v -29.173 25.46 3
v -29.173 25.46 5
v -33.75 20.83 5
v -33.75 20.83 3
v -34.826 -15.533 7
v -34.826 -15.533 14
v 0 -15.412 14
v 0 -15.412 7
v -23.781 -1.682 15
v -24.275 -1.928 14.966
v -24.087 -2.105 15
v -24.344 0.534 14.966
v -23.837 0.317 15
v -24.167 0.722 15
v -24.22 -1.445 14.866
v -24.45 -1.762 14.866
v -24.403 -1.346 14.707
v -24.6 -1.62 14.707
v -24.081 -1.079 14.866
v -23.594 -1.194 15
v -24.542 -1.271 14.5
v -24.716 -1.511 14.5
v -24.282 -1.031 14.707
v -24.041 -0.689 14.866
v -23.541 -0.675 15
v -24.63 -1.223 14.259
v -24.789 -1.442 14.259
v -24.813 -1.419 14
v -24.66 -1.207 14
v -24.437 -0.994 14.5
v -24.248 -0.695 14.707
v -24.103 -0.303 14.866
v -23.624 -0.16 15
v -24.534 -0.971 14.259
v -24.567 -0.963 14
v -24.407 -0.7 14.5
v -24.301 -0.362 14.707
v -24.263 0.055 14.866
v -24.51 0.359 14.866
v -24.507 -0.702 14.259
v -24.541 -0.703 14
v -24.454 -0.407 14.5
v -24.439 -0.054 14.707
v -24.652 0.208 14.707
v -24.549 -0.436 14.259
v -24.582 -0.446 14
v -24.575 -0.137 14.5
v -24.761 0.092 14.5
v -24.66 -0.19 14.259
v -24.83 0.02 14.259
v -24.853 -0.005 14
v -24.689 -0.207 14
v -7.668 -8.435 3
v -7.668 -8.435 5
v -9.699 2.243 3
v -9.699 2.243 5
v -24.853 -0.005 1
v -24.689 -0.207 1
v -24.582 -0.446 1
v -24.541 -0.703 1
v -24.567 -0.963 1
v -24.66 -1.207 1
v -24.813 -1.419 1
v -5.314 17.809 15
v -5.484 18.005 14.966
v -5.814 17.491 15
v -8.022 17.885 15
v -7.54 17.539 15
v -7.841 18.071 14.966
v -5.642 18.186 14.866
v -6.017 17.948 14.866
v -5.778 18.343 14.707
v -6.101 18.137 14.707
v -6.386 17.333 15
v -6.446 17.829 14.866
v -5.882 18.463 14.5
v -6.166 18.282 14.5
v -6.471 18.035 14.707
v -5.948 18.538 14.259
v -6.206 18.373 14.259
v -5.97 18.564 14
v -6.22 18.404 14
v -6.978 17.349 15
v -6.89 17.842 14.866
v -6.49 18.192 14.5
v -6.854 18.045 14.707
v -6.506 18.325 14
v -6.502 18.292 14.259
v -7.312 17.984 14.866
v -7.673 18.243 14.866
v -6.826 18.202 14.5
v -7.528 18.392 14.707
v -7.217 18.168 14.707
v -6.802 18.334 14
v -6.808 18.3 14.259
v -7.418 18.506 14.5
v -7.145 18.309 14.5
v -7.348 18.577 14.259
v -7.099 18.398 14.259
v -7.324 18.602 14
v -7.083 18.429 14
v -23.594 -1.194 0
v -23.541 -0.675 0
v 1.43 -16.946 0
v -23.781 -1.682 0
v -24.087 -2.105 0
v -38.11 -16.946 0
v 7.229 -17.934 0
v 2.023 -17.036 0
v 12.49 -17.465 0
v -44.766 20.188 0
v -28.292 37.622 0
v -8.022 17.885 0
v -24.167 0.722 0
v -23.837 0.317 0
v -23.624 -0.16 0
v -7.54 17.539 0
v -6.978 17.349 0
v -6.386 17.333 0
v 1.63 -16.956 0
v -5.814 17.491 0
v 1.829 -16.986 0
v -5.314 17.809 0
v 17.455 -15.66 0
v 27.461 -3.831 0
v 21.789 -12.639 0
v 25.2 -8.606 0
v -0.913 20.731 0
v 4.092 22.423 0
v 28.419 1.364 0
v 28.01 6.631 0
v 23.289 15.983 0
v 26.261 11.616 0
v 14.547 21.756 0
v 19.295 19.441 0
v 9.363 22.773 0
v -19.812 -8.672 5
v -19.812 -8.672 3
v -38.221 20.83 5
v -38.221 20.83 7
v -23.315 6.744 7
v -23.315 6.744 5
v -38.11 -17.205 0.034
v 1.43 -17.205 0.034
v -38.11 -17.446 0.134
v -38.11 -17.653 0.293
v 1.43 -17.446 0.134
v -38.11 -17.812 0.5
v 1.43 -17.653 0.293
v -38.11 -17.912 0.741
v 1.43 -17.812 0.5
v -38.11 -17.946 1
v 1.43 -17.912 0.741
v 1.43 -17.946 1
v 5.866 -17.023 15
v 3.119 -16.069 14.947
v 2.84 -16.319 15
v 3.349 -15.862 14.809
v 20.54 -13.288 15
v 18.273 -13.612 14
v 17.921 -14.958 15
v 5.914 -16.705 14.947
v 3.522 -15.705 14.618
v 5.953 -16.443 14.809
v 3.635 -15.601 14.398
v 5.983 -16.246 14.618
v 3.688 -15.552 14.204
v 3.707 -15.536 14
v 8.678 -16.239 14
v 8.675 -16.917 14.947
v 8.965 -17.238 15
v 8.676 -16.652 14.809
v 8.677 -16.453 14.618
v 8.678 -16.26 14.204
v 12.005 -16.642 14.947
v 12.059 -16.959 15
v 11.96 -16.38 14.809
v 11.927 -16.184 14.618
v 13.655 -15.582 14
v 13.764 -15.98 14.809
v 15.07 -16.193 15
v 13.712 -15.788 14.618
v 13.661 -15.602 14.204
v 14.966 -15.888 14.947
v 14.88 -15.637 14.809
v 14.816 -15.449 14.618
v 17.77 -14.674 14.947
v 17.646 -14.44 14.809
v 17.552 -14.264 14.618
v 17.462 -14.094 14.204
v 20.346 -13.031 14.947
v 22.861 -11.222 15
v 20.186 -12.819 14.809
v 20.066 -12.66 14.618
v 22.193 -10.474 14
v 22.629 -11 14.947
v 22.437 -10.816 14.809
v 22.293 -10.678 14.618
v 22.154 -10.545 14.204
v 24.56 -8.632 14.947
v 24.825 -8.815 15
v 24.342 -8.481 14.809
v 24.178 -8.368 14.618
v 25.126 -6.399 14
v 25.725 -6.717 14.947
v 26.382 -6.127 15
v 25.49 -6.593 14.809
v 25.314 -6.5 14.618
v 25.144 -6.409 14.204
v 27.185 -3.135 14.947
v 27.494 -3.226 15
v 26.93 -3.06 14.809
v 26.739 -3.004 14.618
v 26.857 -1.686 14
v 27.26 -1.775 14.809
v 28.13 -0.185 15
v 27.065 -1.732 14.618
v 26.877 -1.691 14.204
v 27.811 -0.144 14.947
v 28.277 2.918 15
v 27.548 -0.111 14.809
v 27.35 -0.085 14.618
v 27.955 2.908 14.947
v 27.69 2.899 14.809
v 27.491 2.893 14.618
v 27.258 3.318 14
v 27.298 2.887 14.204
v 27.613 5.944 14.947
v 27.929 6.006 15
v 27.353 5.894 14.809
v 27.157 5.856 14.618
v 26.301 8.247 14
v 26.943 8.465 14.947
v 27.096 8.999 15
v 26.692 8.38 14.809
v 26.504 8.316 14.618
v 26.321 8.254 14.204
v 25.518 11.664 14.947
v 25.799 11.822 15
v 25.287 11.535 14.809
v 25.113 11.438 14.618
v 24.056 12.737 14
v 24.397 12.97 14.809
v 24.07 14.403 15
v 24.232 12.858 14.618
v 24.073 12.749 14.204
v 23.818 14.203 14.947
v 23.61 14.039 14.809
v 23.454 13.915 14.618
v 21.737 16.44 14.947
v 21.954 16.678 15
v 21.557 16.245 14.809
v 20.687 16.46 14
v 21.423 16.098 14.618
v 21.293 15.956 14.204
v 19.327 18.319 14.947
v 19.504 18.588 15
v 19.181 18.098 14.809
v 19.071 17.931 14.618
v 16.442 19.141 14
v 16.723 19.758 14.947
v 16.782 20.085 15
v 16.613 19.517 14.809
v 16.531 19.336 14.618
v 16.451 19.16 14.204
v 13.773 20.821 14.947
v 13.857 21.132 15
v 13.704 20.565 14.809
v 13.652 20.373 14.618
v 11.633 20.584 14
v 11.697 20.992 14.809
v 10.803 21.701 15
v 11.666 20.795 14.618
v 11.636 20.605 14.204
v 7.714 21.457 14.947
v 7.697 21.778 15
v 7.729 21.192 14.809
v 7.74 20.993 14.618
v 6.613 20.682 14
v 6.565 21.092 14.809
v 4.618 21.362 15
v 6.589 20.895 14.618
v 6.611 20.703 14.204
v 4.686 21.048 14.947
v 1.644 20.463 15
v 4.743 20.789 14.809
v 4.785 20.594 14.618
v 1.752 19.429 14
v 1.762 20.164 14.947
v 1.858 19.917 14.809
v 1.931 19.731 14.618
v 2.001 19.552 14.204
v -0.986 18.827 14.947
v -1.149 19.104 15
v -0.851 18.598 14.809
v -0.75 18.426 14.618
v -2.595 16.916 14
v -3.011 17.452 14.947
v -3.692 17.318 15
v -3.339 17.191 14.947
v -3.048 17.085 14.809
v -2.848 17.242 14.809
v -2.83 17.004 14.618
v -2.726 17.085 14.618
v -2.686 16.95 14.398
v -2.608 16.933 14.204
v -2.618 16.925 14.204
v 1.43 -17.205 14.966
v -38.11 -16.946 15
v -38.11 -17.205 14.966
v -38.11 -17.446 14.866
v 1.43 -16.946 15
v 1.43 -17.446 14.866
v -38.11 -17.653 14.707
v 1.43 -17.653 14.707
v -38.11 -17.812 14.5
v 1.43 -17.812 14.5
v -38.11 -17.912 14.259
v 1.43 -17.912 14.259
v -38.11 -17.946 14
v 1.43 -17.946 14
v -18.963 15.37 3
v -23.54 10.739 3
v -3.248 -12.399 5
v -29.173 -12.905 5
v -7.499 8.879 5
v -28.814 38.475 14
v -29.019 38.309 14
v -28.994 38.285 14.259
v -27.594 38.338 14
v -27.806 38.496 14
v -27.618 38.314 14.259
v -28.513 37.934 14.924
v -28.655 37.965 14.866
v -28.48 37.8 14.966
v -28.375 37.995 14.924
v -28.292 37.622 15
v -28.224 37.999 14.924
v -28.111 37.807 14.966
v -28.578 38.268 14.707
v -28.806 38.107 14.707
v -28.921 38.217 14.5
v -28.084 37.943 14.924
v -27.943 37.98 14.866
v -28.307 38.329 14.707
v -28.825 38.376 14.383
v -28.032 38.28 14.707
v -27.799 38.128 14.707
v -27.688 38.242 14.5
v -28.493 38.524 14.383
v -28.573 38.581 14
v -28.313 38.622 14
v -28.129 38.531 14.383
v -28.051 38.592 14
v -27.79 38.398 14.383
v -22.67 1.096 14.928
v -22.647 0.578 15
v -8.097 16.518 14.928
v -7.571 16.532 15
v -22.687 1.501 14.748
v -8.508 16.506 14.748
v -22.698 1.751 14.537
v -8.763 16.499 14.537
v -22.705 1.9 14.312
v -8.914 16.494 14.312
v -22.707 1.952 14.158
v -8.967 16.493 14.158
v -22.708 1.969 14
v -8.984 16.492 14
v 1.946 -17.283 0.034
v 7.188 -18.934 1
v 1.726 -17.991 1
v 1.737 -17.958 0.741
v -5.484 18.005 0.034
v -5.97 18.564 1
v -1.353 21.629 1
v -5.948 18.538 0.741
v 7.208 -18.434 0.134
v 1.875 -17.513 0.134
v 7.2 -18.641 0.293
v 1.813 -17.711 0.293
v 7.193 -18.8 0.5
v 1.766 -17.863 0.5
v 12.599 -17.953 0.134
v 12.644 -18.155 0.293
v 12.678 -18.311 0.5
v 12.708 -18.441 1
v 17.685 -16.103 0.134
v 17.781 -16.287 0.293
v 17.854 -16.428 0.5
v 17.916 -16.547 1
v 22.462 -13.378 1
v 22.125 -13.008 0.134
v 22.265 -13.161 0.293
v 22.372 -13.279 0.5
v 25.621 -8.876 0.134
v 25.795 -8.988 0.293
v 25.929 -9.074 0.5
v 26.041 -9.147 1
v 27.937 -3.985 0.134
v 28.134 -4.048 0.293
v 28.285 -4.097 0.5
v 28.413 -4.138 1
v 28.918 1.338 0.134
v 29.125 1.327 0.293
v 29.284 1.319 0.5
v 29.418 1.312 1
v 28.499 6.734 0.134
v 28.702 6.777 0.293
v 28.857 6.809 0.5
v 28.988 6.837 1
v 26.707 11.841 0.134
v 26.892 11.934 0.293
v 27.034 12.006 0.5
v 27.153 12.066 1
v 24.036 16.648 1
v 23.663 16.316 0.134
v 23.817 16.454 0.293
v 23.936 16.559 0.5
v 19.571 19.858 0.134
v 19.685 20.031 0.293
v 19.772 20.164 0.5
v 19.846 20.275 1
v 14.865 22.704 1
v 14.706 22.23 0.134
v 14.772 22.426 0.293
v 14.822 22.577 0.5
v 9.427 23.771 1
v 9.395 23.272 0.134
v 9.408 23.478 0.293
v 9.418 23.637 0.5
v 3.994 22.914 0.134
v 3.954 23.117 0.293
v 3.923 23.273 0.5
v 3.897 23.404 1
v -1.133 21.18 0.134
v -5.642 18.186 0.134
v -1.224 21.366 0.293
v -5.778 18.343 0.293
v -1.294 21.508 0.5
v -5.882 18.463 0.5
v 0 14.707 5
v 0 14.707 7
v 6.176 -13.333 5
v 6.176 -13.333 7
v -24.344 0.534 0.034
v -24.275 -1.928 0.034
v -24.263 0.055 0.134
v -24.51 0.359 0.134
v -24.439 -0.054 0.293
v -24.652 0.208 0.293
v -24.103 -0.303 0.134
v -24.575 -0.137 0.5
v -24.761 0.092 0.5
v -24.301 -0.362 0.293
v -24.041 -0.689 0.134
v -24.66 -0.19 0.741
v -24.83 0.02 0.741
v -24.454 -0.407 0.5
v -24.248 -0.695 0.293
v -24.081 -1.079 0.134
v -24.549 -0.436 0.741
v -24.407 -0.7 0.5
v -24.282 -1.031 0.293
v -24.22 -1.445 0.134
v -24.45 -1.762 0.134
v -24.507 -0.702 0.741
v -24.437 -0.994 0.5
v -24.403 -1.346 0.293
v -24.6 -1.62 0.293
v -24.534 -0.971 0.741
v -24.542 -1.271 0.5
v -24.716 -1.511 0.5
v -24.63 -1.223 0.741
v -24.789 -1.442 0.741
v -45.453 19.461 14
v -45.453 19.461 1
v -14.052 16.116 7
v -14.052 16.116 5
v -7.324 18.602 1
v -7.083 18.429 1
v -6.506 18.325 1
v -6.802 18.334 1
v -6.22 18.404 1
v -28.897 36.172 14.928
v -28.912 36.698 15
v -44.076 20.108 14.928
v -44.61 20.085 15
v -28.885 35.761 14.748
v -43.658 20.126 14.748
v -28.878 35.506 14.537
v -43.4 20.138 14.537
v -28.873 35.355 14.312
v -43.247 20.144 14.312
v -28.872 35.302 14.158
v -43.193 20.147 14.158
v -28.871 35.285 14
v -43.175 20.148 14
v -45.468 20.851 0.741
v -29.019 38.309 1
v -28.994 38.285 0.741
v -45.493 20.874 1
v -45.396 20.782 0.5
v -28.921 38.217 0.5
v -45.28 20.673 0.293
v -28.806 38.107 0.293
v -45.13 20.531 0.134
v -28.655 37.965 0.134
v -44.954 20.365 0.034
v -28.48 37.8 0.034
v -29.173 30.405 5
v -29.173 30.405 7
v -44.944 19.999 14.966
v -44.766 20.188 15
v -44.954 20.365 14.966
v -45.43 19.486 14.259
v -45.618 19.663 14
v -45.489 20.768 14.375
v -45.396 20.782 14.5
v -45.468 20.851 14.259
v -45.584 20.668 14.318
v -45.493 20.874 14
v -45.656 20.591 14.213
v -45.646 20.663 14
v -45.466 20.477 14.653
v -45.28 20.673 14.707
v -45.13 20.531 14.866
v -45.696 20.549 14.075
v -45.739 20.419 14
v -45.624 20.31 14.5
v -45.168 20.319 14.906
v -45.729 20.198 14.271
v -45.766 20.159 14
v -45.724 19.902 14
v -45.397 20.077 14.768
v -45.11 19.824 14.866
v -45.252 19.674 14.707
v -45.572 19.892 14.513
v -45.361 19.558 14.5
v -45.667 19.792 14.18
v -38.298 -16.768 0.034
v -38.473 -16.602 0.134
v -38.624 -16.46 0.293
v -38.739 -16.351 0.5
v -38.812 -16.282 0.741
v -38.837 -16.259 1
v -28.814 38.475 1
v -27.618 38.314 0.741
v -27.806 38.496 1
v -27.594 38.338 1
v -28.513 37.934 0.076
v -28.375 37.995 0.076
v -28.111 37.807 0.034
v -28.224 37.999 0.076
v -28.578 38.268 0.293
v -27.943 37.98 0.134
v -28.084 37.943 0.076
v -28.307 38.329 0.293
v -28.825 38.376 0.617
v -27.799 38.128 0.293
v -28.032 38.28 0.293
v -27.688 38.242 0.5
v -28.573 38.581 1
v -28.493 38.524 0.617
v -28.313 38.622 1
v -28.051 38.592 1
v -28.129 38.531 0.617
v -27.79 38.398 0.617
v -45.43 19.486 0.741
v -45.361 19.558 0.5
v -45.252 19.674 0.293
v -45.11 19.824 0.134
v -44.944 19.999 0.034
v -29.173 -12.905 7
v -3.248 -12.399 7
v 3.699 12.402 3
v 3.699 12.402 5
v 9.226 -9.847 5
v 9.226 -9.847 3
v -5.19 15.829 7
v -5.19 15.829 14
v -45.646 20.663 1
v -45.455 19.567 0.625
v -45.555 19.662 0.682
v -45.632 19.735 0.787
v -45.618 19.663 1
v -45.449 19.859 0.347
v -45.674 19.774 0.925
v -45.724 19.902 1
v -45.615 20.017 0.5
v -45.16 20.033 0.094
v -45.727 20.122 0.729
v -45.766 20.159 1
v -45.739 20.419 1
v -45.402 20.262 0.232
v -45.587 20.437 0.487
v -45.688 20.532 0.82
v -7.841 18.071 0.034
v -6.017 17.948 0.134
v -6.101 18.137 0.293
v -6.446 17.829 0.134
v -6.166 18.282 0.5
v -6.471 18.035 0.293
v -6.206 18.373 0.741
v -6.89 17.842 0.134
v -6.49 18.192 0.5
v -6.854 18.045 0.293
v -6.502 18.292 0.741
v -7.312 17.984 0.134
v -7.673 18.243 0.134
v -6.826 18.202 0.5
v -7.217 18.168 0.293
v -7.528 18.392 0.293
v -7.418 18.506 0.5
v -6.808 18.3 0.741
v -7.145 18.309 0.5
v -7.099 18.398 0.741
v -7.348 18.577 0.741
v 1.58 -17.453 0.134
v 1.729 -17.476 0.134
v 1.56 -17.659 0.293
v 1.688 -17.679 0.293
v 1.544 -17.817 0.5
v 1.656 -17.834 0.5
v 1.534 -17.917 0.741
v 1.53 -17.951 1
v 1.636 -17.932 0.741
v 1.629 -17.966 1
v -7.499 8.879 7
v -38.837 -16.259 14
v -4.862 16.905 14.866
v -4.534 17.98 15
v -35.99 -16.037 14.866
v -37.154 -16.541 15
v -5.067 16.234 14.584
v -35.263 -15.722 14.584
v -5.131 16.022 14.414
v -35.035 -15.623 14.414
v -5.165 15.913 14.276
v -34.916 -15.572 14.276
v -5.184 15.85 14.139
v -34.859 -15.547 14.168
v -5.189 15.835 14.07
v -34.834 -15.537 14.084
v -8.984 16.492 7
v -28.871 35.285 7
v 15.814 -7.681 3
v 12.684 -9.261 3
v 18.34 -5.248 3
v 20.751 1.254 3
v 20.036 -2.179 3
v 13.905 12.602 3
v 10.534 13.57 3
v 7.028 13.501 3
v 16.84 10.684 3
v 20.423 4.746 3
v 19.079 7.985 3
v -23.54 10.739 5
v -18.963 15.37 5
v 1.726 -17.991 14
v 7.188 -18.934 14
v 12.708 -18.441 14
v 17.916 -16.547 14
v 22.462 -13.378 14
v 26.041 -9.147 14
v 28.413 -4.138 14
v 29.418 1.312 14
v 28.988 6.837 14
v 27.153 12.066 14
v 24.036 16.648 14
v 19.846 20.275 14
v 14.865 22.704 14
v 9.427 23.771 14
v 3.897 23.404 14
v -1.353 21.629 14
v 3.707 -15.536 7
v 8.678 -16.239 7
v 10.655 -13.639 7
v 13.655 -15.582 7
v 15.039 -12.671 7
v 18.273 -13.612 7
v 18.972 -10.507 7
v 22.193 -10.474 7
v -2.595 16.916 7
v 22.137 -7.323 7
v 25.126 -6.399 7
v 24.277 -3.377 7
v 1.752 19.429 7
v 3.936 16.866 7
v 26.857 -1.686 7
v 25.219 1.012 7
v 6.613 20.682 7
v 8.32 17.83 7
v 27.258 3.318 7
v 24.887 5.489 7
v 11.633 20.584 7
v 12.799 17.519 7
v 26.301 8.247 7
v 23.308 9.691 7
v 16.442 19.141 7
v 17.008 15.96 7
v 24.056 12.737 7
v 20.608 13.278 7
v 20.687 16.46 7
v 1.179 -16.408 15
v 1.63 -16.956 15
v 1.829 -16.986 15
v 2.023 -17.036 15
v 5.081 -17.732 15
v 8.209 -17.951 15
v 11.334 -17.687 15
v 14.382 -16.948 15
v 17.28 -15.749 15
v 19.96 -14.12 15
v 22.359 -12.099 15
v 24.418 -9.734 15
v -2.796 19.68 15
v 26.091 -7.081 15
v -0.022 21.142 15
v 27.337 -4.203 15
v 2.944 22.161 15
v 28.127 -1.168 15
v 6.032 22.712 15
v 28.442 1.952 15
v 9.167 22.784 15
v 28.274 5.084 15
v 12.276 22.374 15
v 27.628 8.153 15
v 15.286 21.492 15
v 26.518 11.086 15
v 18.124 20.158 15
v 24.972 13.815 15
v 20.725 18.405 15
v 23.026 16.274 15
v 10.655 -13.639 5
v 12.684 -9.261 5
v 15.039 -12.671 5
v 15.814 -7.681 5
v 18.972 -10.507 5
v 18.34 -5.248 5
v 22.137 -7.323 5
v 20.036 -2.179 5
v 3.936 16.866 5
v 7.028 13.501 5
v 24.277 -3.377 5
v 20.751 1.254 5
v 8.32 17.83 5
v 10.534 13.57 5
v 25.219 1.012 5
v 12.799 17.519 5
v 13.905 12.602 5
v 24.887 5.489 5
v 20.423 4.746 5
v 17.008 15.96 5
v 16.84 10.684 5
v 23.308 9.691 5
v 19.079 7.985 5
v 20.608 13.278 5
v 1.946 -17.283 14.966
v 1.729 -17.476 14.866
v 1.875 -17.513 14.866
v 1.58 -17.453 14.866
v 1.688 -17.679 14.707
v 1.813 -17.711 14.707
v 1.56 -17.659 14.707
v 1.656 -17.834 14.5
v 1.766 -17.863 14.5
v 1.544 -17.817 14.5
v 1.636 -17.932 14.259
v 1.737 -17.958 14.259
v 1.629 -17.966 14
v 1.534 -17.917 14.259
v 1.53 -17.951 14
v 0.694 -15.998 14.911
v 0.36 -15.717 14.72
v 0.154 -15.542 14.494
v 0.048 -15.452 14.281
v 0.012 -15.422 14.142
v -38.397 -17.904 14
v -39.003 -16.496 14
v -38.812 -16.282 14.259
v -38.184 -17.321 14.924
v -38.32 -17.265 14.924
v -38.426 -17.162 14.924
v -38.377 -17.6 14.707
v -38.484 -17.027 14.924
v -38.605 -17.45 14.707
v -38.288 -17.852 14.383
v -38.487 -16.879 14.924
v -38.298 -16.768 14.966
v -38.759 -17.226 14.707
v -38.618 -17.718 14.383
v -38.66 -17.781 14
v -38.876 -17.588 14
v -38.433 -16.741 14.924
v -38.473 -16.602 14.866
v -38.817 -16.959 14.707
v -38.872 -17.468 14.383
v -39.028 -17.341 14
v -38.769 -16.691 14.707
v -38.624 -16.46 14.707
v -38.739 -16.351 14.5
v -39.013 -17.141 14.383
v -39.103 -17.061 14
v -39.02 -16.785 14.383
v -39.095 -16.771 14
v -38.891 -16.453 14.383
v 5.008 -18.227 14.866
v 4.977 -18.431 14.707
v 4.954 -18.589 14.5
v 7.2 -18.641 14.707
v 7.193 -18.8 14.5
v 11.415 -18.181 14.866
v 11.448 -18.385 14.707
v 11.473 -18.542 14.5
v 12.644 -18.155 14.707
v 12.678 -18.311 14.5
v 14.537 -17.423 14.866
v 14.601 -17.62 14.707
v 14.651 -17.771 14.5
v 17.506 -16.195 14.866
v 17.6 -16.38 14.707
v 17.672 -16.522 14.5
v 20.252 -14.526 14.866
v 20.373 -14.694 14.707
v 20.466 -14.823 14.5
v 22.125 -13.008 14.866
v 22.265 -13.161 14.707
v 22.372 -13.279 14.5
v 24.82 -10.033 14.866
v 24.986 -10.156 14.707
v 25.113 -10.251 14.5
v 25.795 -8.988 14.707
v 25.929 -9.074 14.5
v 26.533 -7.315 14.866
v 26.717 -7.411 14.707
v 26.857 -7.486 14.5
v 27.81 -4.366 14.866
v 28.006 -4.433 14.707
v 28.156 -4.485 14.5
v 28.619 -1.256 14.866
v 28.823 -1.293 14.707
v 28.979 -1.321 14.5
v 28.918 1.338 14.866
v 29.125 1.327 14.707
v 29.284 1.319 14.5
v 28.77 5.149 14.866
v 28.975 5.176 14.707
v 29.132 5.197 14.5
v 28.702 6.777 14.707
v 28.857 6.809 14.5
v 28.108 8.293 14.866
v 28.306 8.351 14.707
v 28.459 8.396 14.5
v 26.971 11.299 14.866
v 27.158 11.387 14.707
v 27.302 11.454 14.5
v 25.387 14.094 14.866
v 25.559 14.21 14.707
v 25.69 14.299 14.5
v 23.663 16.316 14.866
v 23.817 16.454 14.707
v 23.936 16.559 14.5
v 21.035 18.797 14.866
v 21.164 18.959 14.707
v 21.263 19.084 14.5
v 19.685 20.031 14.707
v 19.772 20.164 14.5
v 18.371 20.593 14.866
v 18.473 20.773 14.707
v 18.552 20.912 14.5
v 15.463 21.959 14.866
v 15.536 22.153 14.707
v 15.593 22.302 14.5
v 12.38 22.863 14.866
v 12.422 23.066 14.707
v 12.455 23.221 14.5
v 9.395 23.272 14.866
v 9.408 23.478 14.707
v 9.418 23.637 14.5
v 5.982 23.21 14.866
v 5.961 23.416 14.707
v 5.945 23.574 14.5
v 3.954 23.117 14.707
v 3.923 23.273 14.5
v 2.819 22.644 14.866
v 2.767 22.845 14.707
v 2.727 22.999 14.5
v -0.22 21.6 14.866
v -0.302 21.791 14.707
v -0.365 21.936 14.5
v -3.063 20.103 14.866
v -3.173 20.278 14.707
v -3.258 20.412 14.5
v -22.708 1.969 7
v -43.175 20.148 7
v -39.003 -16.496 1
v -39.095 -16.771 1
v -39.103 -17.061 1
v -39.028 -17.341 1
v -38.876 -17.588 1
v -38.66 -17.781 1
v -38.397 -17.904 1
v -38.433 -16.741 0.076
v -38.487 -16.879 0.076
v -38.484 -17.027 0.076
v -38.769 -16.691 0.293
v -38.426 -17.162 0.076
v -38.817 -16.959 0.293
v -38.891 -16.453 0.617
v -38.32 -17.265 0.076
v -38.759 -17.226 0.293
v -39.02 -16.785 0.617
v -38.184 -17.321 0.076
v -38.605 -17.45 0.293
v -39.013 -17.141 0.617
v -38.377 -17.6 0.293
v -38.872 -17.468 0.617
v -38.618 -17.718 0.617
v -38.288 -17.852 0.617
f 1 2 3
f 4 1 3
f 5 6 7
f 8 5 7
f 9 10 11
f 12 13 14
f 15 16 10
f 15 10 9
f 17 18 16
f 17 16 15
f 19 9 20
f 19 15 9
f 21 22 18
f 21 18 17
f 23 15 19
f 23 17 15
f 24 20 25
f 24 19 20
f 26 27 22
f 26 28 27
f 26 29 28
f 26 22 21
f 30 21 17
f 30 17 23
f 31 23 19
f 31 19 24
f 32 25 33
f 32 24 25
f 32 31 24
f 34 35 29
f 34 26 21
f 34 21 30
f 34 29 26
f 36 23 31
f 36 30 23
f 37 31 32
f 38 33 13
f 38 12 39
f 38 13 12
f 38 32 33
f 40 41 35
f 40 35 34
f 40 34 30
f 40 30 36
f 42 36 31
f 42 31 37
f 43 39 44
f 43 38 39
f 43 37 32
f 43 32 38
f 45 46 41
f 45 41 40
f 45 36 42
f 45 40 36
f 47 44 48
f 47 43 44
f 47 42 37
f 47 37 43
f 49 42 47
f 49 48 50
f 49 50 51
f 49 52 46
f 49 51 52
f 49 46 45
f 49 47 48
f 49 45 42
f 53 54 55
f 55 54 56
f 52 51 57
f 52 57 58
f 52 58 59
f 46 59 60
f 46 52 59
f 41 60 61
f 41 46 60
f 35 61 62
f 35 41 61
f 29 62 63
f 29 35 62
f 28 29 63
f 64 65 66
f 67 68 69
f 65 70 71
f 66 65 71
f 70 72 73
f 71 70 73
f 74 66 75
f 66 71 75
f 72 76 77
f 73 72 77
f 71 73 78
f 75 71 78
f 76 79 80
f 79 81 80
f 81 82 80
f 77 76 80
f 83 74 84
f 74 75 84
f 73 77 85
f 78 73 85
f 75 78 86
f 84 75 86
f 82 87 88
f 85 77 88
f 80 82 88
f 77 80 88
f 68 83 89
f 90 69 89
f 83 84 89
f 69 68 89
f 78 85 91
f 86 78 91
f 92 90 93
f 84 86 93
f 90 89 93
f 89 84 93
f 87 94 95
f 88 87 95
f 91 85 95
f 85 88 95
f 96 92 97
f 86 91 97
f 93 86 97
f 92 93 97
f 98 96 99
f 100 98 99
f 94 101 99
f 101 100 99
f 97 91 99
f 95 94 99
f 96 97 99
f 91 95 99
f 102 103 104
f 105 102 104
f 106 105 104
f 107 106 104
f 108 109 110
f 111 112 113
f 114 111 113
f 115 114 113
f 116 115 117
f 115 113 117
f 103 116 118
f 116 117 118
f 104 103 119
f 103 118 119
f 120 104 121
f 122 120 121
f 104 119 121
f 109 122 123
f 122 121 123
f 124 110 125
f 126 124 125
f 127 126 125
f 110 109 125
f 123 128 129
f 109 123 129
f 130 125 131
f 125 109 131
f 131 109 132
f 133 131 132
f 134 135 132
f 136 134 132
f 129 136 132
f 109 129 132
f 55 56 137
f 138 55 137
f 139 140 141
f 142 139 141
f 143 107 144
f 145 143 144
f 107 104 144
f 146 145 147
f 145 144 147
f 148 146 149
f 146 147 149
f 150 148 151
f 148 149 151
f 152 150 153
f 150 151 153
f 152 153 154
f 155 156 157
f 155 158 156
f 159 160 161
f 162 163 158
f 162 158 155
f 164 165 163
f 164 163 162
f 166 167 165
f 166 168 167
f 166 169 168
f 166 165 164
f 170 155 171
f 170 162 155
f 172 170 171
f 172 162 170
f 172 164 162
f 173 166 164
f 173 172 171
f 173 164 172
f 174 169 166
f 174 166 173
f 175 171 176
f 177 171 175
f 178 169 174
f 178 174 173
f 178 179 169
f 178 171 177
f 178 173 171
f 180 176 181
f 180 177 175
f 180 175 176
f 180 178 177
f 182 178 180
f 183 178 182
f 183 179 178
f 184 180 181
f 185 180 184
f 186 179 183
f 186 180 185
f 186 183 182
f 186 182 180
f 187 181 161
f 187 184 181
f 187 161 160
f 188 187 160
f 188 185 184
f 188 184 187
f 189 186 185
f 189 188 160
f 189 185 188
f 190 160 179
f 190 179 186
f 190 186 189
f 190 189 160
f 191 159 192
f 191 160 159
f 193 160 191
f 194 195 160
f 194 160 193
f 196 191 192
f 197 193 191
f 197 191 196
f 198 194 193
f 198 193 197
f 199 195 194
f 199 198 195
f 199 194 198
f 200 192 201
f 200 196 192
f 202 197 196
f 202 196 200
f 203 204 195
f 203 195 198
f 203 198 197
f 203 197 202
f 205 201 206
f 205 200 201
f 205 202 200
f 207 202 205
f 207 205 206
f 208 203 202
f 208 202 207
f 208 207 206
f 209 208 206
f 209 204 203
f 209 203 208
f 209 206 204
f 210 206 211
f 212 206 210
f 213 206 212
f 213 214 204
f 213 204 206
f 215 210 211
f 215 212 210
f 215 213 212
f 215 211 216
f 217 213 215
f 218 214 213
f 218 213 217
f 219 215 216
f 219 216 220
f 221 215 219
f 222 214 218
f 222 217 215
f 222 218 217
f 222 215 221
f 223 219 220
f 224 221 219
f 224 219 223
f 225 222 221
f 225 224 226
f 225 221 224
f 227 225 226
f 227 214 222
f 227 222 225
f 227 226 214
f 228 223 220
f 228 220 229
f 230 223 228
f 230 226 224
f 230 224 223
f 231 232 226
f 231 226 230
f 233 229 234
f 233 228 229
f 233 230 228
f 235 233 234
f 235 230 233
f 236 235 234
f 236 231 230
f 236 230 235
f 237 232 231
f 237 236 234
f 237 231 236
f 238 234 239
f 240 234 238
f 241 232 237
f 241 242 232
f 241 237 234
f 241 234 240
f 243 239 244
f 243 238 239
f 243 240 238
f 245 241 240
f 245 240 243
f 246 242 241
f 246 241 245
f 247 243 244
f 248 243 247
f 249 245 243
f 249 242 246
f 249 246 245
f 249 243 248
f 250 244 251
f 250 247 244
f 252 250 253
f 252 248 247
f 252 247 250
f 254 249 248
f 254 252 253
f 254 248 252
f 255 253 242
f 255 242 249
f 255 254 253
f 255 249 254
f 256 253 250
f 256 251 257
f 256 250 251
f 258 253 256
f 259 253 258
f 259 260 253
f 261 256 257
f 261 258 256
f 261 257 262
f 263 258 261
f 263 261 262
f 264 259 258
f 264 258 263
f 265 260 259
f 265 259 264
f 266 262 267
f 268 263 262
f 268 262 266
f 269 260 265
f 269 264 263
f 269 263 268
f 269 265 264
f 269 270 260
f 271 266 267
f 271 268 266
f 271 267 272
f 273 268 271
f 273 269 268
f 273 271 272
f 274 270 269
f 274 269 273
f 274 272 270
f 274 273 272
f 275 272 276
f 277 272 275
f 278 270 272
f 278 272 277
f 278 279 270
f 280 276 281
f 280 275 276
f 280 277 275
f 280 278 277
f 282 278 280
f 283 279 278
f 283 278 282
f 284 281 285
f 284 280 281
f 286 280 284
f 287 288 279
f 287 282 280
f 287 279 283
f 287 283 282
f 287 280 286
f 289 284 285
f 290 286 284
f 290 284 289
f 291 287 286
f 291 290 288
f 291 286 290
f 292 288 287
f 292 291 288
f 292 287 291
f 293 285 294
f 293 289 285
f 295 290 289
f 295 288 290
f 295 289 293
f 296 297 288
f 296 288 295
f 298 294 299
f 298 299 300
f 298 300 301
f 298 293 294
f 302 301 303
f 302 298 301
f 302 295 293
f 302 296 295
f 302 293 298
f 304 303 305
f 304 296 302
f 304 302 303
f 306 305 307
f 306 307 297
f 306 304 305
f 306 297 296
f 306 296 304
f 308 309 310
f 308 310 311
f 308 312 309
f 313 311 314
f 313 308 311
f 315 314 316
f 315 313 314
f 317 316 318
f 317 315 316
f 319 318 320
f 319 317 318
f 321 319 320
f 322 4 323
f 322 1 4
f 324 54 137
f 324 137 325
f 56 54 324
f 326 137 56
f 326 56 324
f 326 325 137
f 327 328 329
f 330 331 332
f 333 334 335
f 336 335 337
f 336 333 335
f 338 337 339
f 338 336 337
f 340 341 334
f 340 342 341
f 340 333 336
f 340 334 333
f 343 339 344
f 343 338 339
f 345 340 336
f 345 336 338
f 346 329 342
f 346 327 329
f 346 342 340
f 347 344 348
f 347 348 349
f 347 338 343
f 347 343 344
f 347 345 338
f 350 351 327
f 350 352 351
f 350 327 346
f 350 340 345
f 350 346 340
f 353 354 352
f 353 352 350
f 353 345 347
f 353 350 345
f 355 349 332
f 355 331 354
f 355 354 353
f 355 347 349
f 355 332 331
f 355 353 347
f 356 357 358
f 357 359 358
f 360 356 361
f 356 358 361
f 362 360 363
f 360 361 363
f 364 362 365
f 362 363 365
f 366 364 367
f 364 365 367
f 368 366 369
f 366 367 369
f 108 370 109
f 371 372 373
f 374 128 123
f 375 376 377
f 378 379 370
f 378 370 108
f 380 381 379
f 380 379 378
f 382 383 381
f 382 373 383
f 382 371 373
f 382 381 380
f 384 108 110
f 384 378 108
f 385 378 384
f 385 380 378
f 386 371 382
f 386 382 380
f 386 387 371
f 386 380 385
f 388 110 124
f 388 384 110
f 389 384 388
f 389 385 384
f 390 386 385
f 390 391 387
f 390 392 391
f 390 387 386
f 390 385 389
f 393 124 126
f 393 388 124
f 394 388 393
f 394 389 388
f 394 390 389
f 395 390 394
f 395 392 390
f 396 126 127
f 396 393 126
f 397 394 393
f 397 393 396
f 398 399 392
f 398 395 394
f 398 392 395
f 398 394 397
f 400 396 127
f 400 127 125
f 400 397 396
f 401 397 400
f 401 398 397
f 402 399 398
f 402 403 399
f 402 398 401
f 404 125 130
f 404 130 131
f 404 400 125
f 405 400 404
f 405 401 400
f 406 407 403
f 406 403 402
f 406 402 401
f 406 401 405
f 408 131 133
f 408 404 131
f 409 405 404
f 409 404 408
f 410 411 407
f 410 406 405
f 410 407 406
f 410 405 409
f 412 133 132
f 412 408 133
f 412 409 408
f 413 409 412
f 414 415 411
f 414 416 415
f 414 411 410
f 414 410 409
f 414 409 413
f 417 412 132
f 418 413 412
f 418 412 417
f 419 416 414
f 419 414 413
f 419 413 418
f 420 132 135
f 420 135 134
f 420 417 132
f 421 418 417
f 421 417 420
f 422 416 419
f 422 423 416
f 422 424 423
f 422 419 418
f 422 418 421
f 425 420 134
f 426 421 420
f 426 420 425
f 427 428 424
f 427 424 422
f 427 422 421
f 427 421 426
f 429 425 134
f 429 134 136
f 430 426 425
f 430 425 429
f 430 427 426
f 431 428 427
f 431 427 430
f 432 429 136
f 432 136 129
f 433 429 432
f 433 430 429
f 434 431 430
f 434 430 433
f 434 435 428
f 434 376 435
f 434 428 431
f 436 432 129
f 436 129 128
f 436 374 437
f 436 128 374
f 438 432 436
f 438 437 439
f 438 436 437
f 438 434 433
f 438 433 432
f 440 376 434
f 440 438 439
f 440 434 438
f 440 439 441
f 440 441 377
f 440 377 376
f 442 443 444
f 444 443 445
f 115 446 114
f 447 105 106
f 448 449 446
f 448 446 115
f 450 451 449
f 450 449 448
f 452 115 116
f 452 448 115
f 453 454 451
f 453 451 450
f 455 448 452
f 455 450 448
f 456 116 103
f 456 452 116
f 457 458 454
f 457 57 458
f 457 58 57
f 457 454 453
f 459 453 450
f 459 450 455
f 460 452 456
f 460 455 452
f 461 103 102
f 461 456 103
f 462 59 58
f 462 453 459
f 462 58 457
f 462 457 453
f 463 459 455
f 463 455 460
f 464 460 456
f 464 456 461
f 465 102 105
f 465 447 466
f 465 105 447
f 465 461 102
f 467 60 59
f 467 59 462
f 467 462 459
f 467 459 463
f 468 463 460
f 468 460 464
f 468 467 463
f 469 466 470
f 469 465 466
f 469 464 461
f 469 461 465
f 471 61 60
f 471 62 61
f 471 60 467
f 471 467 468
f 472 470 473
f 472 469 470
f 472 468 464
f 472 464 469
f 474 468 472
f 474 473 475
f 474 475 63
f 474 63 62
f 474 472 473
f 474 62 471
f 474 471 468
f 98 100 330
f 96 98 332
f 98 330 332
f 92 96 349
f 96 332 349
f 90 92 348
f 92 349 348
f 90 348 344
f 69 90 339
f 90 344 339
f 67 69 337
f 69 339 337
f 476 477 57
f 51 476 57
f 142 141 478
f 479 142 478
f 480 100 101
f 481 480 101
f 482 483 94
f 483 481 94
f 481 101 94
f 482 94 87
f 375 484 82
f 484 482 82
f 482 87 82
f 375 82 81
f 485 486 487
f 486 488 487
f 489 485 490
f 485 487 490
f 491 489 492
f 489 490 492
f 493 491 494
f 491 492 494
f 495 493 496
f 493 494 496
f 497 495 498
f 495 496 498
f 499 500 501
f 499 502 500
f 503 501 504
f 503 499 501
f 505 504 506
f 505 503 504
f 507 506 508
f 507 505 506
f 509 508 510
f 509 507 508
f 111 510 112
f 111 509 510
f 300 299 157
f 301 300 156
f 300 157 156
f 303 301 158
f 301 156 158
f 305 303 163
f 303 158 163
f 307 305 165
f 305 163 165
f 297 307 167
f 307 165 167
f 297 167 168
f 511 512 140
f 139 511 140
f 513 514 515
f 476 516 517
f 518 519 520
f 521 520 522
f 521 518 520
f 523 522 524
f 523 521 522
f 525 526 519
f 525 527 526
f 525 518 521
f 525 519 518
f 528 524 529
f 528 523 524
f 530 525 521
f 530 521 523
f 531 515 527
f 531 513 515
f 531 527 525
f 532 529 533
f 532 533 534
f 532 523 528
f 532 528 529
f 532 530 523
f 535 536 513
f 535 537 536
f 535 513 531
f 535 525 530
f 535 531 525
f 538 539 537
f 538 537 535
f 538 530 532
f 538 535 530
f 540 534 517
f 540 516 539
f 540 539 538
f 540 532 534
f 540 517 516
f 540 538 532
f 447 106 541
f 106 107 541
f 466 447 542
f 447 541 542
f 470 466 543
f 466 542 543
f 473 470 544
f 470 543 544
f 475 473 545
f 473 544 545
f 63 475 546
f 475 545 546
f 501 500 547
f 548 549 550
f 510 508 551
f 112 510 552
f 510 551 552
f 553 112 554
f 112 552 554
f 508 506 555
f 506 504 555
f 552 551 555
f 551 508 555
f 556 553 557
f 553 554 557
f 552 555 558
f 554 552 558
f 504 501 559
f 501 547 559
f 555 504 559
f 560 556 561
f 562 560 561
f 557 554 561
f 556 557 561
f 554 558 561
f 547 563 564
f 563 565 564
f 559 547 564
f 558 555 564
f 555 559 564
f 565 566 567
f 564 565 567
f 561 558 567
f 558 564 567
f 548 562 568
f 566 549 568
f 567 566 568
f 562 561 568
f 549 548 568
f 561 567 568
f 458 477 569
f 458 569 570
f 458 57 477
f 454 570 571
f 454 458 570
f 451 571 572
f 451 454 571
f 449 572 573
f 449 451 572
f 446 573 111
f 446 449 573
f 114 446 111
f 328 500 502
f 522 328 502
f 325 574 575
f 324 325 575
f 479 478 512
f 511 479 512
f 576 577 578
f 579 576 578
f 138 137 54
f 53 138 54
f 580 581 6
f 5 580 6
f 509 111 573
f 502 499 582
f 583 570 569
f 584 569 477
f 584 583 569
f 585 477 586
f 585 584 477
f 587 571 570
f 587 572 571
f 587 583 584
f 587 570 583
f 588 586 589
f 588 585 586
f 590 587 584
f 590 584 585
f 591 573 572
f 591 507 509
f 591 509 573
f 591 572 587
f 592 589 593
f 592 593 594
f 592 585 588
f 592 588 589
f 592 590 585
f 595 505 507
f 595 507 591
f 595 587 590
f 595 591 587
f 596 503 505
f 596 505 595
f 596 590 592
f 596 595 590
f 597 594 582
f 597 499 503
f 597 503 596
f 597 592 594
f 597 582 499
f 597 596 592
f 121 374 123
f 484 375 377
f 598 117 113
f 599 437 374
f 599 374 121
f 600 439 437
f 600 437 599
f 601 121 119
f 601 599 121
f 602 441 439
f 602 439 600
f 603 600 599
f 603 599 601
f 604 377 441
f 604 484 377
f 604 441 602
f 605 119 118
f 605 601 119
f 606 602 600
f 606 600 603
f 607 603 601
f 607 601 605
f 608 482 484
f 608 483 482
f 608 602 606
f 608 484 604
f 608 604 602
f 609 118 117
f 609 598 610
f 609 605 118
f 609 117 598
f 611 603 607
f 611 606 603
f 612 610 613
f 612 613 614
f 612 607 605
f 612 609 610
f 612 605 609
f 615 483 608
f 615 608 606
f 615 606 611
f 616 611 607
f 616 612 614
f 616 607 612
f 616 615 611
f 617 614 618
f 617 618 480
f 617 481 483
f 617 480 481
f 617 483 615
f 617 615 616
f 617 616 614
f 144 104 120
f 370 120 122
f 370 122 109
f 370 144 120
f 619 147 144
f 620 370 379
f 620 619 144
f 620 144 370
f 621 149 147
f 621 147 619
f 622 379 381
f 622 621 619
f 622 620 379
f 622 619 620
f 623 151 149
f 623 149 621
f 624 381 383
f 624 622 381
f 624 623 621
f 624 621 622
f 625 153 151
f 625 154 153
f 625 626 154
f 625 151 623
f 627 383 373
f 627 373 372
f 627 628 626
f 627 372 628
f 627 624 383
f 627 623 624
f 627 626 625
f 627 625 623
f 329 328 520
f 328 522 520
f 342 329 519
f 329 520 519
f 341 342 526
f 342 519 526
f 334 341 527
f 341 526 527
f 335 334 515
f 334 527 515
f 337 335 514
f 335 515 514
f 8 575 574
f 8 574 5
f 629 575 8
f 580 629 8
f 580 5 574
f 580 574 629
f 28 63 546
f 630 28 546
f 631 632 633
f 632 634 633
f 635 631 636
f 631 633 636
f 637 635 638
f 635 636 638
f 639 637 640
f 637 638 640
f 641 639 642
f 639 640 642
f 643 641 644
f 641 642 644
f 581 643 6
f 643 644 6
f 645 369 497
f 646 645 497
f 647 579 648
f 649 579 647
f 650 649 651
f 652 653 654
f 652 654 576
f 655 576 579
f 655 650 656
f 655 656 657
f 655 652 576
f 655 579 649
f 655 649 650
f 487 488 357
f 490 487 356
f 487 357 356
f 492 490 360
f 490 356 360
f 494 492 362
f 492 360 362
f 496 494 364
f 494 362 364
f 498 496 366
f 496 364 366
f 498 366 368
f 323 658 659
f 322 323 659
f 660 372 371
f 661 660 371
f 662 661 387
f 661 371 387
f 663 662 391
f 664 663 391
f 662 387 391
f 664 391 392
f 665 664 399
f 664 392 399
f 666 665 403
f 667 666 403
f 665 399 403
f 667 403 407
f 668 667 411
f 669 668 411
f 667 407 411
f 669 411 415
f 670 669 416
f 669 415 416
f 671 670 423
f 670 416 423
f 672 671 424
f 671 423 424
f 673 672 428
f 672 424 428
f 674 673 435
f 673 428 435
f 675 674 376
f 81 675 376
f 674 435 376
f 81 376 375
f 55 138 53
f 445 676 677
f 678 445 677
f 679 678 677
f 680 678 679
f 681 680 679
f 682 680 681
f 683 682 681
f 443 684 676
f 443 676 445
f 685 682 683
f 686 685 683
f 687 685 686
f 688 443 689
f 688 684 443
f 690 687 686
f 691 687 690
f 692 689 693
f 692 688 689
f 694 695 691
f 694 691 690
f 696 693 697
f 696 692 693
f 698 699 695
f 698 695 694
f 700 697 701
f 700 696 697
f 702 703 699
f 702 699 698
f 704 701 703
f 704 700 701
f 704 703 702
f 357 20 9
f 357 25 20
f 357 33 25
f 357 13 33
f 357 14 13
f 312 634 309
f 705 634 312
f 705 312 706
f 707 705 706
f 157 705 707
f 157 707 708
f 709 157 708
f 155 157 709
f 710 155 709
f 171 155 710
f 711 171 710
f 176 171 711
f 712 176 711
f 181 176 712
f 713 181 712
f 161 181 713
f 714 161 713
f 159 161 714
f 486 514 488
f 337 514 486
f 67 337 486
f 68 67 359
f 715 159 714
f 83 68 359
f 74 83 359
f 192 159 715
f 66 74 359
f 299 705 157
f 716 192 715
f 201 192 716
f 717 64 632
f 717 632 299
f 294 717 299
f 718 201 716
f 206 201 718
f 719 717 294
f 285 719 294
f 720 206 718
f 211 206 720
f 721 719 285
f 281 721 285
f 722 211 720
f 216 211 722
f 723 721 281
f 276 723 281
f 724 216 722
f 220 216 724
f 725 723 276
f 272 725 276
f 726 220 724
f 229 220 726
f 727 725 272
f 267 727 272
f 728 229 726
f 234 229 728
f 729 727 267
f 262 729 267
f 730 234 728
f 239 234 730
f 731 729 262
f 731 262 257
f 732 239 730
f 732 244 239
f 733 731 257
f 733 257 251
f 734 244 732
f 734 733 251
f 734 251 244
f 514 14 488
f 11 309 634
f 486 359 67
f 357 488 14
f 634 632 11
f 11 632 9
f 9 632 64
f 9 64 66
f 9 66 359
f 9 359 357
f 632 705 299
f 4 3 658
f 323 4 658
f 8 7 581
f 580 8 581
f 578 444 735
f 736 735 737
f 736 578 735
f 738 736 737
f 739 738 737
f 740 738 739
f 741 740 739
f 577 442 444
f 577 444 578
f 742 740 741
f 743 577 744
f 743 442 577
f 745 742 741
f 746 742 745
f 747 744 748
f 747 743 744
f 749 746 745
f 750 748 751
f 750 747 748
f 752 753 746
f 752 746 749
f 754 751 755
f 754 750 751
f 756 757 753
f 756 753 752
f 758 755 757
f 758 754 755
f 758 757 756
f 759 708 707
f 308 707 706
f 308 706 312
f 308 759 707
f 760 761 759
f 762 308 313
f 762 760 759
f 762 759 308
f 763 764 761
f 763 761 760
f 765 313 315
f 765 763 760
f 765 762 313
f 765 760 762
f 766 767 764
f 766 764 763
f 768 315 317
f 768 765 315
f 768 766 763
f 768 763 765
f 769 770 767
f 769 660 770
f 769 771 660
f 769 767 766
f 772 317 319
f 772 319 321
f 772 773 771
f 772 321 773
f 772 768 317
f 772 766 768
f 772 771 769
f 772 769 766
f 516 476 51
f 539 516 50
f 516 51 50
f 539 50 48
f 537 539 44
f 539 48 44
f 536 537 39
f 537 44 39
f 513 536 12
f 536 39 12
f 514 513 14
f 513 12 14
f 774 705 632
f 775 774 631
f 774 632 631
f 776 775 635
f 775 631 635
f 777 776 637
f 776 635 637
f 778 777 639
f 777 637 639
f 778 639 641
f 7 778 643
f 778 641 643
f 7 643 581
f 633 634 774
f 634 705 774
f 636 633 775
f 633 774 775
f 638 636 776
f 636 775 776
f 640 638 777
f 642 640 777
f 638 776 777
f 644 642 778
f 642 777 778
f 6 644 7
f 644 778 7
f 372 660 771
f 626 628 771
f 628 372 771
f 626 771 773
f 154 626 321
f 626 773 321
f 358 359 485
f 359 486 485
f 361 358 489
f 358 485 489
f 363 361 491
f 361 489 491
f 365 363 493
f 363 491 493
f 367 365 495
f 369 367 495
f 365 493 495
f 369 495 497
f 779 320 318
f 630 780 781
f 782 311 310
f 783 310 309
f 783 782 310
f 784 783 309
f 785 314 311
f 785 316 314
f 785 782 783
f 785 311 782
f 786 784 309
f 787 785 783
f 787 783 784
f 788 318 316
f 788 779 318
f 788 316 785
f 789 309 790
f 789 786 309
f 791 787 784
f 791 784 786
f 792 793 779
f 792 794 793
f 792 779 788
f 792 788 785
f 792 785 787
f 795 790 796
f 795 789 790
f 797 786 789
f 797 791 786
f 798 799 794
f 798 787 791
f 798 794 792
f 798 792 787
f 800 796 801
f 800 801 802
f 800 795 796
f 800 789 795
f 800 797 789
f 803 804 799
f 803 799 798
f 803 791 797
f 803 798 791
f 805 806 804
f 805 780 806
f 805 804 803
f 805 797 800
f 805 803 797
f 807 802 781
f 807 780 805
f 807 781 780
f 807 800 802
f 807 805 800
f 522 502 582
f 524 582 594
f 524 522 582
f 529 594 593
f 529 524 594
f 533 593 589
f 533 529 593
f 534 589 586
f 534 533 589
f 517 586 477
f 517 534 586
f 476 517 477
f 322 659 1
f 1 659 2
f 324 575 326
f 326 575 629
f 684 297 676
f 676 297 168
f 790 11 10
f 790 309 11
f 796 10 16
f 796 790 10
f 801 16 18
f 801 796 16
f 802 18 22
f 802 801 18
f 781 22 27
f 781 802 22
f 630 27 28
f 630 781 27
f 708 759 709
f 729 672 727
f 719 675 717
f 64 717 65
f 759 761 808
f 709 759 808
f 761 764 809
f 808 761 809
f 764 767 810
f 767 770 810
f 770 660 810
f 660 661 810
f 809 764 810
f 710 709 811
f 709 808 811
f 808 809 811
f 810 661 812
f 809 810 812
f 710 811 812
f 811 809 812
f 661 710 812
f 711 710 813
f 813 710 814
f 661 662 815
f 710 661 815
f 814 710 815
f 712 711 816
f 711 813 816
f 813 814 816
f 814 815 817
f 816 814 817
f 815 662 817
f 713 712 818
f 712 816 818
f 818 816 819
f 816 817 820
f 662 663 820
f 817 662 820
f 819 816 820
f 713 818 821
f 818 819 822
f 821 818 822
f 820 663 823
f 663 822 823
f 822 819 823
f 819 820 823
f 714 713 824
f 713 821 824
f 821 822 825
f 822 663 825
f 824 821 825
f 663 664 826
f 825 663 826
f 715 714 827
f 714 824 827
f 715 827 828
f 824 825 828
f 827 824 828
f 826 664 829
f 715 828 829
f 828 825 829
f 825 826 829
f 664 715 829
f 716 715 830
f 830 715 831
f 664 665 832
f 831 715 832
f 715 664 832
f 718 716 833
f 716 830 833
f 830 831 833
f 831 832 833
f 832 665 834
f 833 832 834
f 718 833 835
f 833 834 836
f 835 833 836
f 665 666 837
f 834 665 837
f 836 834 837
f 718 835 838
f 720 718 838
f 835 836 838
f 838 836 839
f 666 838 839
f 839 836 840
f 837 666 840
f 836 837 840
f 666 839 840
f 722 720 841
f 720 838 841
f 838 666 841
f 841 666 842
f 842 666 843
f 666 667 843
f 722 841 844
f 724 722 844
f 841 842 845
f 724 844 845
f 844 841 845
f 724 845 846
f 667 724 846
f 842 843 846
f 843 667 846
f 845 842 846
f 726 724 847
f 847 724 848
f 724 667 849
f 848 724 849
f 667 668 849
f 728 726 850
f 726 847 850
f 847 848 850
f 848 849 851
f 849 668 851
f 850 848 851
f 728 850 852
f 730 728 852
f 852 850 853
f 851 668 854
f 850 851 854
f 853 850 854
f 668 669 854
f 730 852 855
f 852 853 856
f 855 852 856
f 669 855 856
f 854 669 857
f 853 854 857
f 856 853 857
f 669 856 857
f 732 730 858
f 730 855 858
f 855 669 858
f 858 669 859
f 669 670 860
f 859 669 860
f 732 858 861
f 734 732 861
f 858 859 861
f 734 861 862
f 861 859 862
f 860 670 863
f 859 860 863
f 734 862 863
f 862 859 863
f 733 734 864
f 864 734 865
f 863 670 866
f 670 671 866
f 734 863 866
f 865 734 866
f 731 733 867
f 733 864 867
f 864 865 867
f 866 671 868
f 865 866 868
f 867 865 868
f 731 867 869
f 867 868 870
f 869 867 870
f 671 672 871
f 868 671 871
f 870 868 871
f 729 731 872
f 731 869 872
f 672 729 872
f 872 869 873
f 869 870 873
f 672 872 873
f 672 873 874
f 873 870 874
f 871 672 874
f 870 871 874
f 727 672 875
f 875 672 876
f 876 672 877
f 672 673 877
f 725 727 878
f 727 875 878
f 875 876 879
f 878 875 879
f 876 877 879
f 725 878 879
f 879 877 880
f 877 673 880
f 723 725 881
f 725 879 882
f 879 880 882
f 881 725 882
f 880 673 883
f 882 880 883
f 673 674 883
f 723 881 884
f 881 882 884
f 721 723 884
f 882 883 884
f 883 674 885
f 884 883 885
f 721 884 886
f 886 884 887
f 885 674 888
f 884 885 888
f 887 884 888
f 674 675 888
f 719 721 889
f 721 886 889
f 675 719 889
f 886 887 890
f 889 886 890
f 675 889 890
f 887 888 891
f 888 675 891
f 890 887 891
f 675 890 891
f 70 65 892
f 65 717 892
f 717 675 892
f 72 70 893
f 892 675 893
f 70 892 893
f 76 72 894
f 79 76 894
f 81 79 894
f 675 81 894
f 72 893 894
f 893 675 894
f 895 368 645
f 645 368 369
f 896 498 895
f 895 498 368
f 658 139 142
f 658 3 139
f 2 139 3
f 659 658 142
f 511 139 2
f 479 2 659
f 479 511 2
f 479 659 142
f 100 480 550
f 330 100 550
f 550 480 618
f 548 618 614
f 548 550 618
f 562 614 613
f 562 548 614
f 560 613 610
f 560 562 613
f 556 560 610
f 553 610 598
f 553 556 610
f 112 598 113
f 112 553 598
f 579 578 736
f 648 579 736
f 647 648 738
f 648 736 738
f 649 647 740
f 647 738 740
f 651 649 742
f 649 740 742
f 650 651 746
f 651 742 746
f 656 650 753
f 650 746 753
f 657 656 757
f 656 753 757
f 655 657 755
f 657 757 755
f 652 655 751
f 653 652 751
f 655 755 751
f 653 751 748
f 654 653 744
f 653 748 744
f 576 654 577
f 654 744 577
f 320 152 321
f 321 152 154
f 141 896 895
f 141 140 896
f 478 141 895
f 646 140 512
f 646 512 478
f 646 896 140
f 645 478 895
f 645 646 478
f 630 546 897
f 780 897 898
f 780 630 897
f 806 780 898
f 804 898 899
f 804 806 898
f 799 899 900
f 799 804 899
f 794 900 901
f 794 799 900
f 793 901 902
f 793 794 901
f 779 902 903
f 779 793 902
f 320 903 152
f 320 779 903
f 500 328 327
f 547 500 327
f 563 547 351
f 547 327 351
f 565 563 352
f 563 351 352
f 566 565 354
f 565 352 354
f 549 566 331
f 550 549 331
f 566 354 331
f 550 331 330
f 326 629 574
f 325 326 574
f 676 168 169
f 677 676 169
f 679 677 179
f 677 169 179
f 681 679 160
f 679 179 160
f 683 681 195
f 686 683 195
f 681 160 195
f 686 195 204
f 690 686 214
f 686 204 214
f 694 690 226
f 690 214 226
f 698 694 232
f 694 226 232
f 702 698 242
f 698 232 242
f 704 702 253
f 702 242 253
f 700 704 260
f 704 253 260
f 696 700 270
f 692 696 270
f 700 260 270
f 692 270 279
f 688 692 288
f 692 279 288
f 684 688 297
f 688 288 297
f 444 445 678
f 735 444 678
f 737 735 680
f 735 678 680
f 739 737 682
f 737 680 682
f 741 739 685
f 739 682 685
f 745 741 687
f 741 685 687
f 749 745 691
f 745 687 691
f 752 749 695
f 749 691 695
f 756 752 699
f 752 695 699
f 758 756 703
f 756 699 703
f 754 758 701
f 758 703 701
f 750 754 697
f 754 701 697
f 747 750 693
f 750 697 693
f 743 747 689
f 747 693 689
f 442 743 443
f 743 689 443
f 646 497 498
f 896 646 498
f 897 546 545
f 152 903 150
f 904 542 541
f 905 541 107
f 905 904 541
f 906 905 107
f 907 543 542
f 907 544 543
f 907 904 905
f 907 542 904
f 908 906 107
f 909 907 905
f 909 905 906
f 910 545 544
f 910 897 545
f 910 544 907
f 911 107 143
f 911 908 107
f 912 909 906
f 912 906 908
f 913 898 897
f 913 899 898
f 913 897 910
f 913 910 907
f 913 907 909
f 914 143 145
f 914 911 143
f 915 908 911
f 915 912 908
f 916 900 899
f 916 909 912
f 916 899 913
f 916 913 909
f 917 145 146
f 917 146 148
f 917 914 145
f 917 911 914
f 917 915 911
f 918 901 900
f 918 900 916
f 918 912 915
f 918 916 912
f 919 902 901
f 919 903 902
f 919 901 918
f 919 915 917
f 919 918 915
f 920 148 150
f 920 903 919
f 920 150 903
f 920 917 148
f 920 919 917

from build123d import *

# Parameters (mm, degrees)
F1_DEPTH  = 15
F3_DEPTH  = 8
F4_R      = 1
F6_DEPTH  = 2
F8_DEPTH  = 2
F10_DEPTH = 2
F12_DEPTH = 2


# Not quite as in the source:
# - a feature names something its author has since deleted; it is built from what else it names


with BuildPart() as f1:
    # F0 (on Top) → F1 (new body)
    with BuildSketch(Plane.XY):
        with BuildLine():
            Line((-28.3214918106, 39.0464443552), (-46.1799150741, 20.1475579913))
            Line((-46.1799150741, 20.1475579913), (-24.1265251153, -0.6917001902))
            Line((-24.1265251153, -0.6917001902), (-40.4306314886, -17.9457124323))
            Line((-40.4306314886, -17.9457124323), (1.5834453516, -17.9457124323))
            ThreePointArc((1.5834453516, -17.9457124323), (28.9057292456, 7.2125327526), (-6.6504706629, 17.9457124323))
            Line((-6.6504706629, 17.9457124323), (-28.3214918106, 39.0464443552))
        make_face()
    extrude(amount=F1_DEPTH)

    # F2 (on face) → F3 (cut)
    with BuildSketch(Plane.XY.offset(15)):
        with BuildLine():
            Line((-2.5950646959, 16.9163886458), (3.7065453362, -15.5357513577))
            ThreePointArc((3.7065453362, -15.5357513577), (26.9474296129, 5.8151003686), (-2.5950646959, 16.9163886458))
        make_face()
        Polygon((-5.1901293918, 15.8294621167), (-34.8258907848, -15.5329307781), (0, -15.4121983796), align=None)
        Polygon((-28.8714991264, 35.28469053), (-43.1752689183, 20.1475579913), (-22.7079026012, 1.9694547007), (-8.9844264049, 16.4924847199), align=None)
    extrude(amount=-F3_DEPTH, mode=Mode.SUBTRACT)

    # F4
    f4_edges = [f1.edges().sort_by_distance(p)[0] for p in [
        (-37.250703, 29.597001, 0),
        (-35.15322, 9.727929, 0),
        (-32.278578, -9.318706, 0),
        (-19.423593, -17.945712, 0),
        (28.905729, 7.212533, 0),
        (-17.485981, 28.496078, 0),
        (-18.927963, 25.888588, 15),
        (-36.023384, 27.716124, 15),
        (-32.941586, 11.058506, 15),
        (-15.846165, 9.23097, 15),
        (-17.412945, -15.472565, 15),
        (-20.00801, 0.148266, 15),
        (-2.595065, 0.208632, 15),
        (0.55574, 0.690319, 15),
        (26.94743, 5.8151, 15),
        (28.905729, 7.212533, 15),
        (-19.423593, -17.945712, 15),
        (-32.278578, -9.318706, 15),
        (-35.15322, 9.727929, 15),
        (-37.250703, 29.597001, 15),
        (-17.485981, 28.496078, 15),
        (-6.650471, 17.945712, 7.5),
        (-28.321492, 39.046444, 7.5),
        (-46.179915, 20.147558, 7.5),
        (-40.430631, -17.945712, 7.5),
        (-24.126525, -0.6917, 7.5),
        (1.583445, -17.945712, 7.5),
    ]]
    fillet(f4_edges, radius=F4_R)

    # F5 (on face) → F6 (cut)
    with BuildSketch(Plane.XY.offset(7)):
        Polygon((-29.1725099087, -12.9052552501), (-3.2478775829, -12.3988948762), (-7.4992091395, 8.8786818087), align=None)
        Polygon((-23.3146349898, 6.744285012), (-14.0517026385, 16.1163697069), (-29.1725099087, 30.4047130048), (-38.2205257573, 20.8295438638), align=None)
        with BuildLine():
            Line((0, 14.7073501721), (6.1764790816, -13.333094822))
            ThreePointArc((6.1764790816, -13.333094822), (24.8870467759, 5.4887589231), (0, 14.7073501721))
        make_face()
    extrude(amount=-F6_DEPTH, mode=Mode.SUBTRACT)

    # F7 (on face) → F8 (cut)
    with BuildSketch(Plane.XY.offset(5)):
        with BuildLine():
            Line((3.6986530758, 12.4016236514), (9.2264488339, -9.847166948))
            ThreePointArc((9.2264488339, -9.847166948), (20.4226323137, 4.7456631043), (3.6986530758, 12.4016236514))
        make_face()
    extrude(amount=-F8_DEPTH, mode=Mode.SUBTRACT)

    # F9 (on face) → F10 (cut)
    with BuildSketch(Plane.XY.offset(5)):
        Polygon((-9.698738344, 2.2434238344), (-19.8120251298, -8.6724534631), (-7.6682440939, -8.4352609186), align=None)
    extrude(amount=-F10_DEPTH, mode=Mode.SUBTRACT)

    # F11 (on face) → F12 (cut)
    with BuildSketch(Plane.XY.offset(5)):
        Polygon((-33.7495236595, 20.8295438638), (-23.5399451314, 10.7388715832), (-18.9629313805, 15.3698198505), (-29.1725099087, 25.4604921311), align=None)
    extrude(amount=-F12_DEPTH, mode=Mode.SUBTRACT)


solid = f1.part
